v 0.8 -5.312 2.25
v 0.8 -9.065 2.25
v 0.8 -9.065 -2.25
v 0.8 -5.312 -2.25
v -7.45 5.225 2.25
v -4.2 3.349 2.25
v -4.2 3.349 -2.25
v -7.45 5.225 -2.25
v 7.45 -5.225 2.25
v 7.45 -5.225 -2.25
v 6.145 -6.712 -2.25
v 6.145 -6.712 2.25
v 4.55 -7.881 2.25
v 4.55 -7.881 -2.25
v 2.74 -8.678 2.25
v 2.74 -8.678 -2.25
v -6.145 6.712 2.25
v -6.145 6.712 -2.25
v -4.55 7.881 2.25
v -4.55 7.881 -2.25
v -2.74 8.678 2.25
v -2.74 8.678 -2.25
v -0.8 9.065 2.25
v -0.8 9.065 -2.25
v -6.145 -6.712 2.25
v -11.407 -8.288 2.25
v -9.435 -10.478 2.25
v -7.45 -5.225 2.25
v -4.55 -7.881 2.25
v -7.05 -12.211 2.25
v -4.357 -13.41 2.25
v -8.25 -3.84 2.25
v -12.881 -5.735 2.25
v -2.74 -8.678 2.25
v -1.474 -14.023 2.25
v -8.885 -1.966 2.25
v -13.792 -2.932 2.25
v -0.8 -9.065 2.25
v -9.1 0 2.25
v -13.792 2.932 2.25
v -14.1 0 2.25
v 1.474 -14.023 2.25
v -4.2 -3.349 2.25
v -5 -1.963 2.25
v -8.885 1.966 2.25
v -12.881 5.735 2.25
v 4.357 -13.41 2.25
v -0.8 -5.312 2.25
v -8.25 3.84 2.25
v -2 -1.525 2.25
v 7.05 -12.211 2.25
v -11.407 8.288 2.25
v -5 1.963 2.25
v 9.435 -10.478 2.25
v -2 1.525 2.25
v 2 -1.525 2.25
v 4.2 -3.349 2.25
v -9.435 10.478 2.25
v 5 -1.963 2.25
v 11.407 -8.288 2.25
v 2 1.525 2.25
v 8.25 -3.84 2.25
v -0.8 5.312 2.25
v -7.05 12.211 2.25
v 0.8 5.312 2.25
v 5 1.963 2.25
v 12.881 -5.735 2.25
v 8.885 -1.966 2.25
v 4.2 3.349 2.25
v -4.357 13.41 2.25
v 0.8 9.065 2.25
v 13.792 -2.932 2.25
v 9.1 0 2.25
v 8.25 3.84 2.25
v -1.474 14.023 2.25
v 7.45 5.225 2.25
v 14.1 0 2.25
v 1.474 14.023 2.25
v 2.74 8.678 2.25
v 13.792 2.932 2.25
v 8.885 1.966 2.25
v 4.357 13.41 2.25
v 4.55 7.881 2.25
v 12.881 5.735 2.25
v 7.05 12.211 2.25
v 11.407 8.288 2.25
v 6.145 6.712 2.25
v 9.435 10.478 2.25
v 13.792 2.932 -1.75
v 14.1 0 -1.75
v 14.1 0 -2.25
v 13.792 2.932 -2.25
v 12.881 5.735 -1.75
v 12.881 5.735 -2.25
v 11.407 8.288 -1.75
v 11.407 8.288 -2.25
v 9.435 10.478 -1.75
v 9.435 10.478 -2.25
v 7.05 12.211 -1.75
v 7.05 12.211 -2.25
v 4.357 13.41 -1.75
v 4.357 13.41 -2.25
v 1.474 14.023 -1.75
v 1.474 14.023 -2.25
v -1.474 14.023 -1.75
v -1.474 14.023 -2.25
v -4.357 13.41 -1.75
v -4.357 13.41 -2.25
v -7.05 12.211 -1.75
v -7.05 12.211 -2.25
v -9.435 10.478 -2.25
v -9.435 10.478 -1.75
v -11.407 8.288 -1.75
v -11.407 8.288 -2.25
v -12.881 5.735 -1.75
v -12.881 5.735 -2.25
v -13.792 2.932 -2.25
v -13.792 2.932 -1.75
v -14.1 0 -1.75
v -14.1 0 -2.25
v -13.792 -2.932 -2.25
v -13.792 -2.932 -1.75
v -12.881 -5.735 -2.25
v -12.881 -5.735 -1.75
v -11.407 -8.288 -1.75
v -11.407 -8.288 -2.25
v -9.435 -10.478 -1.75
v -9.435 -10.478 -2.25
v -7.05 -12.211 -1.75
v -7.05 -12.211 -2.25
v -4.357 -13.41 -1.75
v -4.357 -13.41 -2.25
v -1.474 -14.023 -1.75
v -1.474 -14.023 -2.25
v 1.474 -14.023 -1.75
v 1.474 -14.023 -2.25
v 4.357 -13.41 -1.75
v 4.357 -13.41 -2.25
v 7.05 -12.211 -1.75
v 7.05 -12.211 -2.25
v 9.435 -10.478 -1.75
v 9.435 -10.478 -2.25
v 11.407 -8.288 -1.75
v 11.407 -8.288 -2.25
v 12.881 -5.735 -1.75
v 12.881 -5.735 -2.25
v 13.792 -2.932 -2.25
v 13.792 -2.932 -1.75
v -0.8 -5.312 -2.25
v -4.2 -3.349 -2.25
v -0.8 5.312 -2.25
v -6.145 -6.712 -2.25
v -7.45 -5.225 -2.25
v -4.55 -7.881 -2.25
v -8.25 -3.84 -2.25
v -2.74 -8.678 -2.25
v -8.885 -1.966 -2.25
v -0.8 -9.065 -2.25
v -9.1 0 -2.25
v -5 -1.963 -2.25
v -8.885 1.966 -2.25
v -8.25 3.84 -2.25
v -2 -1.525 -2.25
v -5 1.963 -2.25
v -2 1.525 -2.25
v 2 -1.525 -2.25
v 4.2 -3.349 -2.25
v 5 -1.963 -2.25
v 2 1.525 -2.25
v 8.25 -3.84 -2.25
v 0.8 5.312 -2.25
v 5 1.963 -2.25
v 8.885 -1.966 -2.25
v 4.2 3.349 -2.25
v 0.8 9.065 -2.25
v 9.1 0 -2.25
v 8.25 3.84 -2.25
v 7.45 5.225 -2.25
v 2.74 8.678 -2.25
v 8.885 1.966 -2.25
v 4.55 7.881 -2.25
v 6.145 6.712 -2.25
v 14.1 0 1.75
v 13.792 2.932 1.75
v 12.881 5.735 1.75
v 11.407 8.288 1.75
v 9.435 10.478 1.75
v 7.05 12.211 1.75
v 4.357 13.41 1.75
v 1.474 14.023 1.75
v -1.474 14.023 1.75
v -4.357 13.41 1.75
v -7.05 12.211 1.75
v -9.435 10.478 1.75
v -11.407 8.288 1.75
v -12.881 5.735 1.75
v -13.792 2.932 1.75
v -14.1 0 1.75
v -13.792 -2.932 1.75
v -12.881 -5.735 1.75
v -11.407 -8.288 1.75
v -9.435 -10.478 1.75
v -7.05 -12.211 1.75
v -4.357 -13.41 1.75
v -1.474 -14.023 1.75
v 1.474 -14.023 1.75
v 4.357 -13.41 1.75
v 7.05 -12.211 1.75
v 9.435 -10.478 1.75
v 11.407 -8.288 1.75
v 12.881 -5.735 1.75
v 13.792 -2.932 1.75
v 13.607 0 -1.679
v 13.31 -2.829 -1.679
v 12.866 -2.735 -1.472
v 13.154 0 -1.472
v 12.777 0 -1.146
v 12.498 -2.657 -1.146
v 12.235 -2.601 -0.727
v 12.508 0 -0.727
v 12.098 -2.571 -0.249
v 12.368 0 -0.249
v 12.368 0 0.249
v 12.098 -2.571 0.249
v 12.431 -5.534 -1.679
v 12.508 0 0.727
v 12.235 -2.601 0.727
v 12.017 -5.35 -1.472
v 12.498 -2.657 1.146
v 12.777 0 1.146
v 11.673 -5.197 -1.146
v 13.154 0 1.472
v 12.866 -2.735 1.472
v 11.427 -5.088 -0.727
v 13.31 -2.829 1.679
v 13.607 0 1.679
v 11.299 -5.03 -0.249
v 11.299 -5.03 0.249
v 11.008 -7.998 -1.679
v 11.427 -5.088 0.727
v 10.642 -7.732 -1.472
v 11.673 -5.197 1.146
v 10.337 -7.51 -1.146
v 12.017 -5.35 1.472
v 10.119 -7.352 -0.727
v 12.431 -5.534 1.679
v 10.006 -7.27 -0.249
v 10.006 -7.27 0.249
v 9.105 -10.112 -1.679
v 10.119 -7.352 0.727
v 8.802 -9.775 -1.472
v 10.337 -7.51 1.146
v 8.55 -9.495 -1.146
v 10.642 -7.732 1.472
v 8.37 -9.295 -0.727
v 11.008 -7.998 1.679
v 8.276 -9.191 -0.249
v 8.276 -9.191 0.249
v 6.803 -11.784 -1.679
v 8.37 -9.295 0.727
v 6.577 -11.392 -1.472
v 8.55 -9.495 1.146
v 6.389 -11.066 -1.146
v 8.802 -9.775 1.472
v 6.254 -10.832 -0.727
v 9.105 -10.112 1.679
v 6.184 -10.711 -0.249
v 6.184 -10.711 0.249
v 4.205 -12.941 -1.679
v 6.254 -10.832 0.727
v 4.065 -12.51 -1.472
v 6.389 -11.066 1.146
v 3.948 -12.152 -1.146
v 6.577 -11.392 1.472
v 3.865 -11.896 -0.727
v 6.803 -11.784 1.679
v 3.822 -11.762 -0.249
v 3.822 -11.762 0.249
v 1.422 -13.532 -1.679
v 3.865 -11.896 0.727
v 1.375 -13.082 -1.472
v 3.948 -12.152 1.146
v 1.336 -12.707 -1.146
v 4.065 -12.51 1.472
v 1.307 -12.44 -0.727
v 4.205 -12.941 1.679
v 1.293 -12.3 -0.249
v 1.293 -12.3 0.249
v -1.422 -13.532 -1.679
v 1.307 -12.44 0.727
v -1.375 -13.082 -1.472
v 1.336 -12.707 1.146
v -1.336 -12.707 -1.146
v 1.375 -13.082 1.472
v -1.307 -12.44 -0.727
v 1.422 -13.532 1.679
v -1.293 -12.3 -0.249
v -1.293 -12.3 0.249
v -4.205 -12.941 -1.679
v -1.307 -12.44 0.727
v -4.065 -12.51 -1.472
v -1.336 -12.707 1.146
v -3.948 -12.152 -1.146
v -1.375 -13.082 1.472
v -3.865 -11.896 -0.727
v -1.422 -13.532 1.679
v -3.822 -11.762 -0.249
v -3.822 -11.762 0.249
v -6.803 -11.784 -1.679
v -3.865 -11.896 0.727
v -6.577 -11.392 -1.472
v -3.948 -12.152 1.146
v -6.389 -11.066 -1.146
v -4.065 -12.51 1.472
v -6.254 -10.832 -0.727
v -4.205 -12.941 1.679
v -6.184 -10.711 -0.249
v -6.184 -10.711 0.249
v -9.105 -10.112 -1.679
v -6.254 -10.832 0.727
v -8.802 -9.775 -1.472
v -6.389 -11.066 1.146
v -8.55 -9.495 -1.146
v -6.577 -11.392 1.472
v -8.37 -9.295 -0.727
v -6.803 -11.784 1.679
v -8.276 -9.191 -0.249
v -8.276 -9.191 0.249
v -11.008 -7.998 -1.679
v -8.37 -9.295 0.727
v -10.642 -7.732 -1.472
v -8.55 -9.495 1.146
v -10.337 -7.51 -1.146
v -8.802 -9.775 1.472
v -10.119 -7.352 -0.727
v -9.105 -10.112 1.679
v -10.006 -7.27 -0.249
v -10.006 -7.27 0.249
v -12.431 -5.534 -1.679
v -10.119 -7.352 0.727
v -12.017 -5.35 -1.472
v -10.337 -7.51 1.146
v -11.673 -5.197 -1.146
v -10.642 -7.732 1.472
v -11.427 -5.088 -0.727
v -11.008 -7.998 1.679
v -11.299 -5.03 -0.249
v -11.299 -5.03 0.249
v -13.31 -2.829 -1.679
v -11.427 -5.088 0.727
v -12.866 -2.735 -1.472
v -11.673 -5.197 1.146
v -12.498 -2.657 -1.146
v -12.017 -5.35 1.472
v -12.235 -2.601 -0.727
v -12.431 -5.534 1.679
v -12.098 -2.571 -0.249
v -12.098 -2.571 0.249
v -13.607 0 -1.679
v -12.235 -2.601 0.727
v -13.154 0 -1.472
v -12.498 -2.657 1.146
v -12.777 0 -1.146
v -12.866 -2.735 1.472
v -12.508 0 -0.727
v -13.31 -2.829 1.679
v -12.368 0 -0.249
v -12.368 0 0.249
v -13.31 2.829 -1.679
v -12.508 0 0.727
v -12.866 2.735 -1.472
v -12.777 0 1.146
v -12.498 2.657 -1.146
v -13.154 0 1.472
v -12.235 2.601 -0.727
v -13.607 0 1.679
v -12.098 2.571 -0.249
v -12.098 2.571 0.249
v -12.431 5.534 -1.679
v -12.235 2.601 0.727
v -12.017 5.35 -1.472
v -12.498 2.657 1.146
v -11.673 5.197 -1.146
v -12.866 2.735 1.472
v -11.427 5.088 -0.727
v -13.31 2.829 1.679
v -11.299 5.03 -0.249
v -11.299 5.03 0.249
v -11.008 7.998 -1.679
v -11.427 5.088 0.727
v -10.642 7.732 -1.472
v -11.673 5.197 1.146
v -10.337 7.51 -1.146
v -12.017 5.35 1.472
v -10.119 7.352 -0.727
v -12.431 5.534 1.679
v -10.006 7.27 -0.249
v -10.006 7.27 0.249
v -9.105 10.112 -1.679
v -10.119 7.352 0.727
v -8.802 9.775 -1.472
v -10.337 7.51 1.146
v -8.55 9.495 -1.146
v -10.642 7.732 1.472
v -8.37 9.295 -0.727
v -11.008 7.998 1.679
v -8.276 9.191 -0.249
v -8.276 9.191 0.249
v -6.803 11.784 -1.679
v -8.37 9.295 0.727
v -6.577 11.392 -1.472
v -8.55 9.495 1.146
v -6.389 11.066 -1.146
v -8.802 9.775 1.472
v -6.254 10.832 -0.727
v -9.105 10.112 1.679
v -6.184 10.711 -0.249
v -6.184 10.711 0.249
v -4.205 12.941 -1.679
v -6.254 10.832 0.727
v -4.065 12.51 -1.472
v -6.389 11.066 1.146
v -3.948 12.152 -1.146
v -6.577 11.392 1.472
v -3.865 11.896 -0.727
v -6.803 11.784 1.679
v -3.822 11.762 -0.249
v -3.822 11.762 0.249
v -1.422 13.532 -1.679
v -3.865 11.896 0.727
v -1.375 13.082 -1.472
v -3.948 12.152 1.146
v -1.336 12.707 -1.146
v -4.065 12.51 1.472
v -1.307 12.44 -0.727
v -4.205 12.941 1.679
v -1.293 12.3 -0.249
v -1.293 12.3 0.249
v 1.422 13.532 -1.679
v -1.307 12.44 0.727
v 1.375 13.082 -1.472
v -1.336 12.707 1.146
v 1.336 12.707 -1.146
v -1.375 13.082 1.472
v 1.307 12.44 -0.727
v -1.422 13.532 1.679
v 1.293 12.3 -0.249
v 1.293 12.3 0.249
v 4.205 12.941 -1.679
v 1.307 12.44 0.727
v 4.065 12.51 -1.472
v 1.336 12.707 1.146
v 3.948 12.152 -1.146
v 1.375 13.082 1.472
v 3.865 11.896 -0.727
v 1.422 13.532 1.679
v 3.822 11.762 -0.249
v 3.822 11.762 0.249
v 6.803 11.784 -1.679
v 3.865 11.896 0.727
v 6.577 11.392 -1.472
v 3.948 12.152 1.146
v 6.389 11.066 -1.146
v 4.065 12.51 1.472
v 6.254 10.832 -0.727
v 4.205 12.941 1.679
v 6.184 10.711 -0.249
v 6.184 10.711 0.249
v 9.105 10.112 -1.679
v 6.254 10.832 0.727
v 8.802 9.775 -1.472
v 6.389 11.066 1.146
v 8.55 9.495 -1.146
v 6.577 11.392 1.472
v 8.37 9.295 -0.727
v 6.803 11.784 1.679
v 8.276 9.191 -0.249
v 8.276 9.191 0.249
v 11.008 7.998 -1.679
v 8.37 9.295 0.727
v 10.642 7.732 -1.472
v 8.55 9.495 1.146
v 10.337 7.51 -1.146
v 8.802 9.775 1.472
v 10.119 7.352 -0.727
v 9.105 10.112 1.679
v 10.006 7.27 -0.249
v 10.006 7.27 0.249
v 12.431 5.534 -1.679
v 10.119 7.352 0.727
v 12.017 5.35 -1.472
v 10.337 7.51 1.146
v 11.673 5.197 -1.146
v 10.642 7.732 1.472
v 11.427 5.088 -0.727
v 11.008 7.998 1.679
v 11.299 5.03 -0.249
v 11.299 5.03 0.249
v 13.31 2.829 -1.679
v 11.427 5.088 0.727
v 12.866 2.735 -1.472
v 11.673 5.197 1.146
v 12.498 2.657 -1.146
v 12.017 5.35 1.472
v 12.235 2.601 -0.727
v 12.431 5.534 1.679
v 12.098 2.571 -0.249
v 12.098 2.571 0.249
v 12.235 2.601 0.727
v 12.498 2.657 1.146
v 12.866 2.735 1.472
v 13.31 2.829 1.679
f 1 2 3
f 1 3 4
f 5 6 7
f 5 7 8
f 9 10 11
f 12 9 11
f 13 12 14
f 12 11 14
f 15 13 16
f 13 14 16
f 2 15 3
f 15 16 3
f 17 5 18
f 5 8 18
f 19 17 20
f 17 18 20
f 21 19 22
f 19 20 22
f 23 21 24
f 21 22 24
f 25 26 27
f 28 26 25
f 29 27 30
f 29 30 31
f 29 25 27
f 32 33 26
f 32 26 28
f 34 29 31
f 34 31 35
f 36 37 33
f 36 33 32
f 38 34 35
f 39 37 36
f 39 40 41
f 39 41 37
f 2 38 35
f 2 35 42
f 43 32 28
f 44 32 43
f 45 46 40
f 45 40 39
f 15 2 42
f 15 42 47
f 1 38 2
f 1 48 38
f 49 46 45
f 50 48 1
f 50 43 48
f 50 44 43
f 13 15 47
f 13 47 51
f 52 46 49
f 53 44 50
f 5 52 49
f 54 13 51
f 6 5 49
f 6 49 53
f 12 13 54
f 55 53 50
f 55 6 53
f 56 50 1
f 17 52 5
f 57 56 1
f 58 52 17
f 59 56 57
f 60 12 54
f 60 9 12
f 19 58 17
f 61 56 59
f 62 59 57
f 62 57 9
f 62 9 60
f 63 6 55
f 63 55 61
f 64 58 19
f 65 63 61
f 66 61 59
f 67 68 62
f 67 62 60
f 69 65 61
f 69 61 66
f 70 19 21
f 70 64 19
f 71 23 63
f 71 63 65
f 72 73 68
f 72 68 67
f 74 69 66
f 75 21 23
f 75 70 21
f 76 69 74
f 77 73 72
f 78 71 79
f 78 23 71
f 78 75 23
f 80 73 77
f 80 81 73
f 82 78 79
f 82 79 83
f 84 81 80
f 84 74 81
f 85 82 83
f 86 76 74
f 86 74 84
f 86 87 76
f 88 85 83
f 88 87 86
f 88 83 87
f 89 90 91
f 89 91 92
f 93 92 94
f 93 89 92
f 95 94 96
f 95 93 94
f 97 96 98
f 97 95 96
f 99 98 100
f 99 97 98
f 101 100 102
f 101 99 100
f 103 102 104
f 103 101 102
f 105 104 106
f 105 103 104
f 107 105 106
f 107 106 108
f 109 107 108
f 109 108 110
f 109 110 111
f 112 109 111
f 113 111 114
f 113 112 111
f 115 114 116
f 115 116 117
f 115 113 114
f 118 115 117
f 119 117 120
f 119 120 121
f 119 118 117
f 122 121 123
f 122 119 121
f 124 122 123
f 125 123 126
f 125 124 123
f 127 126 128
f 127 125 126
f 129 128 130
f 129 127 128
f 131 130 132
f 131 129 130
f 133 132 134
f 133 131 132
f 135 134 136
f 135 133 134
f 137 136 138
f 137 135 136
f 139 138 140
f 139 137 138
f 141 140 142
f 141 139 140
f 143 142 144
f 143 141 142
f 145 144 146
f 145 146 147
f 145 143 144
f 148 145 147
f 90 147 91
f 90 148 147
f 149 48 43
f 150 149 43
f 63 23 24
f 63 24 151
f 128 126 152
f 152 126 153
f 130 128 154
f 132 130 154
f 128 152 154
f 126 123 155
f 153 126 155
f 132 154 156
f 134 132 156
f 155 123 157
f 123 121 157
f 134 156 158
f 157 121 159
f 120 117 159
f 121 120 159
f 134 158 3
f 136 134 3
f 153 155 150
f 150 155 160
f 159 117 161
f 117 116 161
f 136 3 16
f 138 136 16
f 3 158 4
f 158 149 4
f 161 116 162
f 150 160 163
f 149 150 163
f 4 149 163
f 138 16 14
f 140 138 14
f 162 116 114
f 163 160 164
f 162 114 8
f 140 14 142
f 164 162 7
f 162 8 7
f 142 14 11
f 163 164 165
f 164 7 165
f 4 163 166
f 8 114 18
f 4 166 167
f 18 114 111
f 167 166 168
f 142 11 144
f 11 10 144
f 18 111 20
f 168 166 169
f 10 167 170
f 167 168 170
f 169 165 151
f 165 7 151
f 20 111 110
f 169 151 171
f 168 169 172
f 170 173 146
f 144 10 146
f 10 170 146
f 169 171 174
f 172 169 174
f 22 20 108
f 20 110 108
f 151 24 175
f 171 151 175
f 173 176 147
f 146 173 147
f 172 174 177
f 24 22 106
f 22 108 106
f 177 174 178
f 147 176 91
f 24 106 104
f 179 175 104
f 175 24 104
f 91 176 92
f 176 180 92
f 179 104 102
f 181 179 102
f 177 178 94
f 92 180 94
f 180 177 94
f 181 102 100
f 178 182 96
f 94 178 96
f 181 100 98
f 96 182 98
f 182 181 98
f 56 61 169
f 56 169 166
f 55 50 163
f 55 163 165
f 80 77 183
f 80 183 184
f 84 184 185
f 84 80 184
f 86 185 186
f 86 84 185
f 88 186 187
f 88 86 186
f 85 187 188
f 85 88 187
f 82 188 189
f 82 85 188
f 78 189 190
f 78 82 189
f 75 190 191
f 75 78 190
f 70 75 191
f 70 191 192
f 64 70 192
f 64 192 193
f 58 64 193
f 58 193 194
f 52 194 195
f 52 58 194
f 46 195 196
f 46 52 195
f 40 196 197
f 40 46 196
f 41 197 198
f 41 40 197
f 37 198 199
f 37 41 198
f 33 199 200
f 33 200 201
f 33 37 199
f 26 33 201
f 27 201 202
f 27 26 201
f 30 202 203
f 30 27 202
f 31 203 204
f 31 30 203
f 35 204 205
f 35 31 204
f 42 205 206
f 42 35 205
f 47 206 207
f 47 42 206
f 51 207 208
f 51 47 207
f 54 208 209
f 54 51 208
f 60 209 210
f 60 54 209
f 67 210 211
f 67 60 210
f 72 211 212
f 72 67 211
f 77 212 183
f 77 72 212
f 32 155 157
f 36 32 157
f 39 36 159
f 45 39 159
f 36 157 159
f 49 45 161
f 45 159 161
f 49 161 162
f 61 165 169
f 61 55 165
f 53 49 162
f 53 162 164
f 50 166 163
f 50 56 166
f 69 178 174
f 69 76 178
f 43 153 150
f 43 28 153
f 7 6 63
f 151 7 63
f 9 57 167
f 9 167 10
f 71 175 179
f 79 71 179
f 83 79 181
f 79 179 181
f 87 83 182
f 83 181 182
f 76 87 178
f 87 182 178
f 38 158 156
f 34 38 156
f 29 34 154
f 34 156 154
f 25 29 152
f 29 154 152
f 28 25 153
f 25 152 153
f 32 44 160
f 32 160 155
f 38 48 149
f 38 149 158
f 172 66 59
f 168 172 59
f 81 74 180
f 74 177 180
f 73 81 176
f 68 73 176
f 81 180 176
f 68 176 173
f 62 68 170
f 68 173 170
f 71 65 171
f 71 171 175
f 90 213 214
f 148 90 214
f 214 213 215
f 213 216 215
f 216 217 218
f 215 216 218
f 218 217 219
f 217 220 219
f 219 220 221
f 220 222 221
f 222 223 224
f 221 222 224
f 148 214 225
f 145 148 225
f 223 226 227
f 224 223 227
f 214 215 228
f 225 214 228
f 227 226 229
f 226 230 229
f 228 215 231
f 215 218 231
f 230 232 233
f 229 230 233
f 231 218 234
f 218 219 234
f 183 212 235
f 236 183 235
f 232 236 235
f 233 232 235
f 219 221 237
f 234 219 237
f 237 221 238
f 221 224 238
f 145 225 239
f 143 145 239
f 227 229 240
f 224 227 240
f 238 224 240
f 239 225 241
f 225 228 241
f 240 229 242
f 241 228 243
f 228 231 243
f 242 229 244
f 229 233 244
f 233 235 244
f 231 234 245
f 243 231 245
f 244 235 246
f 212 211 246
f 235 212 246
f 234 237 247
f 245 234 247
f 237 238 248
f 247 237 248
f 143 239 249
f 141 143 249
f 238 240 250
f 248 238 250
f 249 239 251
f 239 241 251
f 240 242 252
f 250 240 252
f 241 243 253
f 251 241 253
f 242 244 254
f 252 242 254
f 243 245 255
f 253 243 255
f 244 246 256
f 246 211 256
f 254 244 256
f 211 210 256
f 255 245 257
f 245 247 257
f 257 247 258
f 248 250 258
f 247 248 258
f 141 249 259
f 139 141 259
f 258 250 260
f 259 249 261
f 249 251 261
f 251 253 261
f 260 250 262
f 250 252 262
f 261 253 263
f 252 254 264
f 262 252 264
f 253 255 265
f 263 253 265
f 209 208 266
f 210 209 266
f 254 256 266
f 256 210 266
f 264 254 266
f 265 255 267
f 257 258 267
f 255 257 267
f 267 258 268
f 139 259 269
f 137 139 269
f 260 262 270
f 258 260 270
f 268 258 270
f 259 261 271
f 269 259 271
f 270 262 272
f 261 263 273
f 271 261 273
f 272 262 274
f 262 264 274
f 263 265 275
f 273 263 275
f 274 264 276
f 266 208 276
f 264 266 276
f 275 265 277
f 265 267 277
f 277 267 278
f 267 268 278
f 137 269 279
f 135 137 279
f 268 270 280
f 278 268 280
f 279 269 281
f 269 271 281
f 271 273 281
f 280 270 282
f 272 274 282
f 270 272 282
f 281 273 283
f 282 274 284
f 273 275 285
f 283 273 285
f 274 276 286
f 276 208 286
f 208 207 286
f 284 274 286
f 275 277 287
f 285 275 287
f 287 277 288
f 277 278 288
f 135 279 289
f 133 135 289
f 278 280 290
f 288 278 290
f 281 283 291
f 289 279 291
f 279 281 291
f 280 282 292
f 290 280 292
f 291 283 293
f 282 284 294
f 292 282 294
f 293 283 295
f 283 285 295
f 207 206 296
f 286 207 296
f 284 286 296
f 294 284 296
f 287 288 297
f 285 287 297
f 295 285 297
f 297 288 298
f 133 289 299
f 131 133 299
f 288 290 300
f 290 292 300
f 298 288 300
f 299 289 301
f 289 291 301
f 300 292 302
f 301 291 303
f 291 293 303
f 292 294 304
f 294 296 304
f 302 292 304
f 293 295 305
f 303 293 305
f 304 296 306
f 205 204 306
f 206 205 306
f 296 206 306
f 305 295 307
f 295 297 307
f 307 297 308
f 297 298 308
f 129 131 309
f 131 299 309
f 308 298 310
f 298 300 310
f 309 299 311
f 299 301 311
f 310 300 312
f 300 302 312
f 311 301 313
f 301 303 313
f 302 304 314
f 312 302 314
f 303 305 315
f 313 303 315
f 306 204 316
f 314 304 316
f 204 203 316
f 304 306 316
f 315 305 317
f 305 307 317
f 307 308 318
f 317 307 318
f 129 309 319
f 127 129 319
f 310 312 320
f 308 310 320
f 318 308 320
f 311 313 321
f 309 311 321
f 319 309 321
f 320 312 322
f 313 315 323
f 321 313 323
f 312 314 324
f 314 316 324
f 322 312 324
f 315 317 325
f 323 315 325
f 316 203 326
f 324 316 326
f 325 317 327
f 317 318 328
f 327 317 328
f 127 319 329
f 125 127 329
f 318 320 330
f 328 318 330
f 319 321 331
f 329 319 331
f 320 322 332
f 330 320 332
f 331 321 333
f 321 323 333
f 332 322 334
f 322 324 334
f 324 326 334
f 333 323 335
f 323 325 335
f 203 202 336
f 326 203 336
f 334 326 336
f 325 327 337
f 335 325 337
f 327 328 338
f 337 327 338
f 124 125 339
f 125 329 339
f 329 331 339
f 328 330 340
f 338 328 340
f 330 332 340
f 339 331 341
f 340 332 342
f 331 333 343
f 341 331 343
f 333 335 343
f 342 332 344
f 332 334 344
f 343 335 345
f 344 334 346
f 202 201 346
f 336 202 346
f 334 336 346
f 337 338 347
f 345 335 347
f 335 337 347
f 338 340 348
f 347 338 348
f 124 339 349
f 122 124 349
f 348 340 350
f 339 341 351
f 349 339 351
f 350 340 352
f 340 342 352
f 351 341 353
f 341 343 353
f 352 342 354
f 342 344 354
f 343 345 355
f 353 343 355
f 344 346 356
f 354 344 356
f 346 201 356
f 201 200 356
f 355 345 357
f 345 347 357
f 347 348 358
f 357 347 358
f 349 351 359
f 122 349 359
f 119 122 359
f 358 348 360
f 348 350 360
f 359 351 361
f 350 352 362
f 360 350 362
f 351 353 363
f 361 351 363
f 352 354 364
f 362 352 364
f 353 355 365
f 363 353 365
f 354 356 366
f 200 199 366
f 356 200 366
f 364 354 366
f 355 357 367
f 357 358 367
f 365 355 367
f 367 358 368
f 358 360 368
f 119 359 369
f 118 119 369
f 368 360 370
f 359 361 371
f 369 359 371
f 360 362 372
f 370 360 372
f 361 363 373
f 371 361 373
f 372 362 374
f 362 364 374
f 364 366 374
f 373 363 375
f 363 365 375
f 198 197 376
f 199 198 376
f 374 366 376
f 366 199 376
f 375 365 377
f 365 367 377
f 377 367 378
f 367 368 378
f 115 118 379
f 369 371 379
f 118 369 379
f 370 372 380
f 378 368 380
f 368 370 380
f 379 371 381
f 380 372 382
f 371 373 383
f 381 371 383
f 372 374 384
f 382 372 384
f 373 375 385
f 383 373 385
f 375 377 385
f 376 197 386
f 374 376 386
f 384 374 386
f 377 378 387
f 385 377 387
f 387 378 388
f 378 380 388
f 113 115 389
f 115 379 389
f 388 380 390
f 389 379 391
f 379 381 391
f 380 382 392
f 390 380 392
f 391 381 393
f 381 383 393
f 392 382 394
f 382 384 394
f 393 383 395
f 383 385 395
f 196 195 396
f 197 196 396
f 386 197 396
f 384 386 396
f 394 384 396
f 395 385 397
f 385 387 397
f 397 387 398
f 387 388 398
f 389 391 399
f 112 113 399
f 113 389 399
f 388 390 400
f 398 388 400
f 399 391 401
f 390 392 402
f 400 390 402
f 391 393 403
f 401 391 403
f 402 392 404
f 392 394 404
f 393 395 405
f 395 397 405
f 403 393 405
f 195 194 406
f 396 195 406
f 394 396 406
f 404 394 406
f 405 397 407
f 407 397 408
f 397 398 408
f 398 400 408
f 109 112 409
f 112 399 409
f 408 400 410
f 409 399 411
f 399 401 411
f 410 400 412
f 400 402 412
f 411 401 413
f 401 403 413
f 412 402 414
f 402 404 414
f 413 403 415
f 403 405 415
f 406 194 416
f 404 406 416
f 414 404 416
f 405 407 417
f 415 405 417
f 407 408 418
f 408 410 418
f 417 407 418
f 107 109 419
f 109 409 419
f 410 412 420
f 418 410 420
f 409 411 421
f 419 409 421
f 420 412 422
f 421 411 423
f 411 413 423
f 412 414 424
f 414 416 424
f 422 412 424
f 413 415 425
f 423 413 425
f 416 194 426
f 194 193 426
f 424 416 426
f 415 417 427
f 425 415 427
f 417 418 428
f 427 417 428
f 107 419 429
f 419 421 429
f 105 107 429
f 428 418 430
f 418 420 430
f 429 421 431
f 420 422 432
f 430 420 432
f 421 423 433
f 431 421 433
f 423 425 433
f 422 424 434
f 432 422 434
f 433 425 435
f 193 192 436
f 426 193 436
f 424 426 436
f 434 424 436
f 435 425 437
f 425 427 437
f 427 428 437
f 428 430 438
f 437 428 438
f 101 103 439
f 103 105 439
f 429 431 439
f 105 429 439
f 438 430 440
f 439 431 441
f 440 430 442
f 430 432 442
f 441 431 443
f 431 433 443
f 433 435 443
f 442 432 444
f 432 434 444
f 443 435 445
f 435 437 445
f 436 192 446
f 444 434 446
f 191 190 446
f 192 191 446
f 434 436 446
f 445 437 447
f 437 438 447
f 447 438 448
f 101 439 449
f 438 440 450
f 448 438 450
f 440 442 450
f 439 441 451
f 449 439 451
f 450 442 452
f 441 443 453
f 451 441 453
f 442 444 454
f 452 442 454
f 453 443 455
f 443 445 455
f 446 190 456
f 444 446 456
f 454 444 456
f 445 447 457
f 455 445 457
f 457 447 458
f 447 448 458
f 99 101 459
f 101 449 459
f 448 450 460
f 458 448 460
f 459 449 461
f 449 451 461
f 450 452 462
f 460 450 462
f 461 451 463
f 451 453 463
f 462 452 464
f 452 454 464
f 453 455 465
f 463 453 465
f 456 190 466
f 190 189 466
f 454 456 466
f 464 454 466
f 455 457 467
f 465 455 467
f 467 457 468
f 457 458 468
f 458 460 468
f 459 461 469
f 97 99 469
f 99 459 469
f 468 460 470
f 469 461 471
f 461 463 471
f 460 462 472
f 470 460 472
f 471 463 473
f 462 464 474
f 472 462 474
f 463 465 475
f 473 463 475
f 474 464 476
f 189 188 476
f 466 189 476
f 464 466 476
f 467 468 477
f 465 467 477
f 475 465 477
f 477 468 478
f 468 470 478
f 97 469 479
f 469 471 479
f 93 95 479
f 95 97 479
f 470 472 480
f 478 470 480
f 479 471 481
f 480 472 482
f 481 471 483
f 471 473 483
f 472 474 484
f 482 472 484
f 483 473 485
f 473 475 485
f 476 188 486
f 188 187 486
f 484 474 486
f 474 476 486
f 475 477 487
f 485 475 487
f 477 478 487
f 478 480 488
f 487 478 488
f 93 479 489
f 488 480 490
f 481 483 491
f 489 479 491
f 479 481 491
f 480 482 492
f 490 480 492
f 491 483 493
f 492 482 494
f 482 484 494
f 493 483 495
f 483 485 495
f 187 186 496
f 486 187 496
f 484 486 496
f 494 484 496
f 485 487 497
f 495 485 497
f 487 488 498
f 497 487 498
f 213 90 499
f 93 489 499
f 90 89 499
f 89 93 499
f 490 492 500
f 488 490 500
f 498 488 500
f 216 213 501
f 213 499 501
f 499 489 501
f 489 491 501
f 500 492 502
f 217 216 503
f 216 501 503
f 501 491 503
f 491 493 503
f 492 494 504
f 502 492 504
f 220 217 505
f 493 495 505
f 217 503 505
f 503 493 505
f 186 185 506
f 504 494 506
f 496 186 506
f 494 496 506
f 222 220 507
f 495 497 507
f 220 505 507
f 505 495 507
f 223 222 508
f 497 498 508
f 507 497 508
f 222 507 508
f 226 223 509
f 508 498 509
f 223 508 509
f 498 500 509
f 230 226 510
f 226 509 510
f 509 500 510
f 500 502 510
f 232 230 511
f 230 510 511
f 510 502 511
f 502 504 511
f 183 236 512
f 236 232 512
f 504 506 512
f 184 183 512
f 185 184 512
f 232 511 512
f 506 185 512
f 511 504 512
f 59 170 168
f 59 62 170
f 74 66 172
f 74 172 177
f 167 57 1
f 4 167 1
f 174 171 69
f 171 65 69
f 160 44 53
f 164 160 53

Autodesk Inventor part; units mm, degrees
ref_plane "YZ Plane" through (0, 0, 0) normal (1, 0, 0) x (0, 1, 0)
ref_plane "XZ Plane" through (0, 0, 0) normal (0, 1, 0) x (-1, 0, 0)
ref_plane "XY Plane" through (0, 0, 0) normal (0, 0, 1) x (1, 0, 0)
sketch "スケッチ1" plane through (0, 0, 0) normal (0, 1, 0) x (-1, 0, 0)
  line L0 (0, 0) -> (-64.0652, 0) construction
  circle A0 centre (-14.1, 0) radius 1.75
  line L1 (-9.1, -2.25) -> (-14.1, -2.25)
  line L2 (-14.1, -2.25) -> (-14.1, 2.25)
  line L3 (-14.1, 2.25) -> (-9.1, 2.25)
  line L4 (-9.1, 2.25) -> (-9.1, -2.25)
  line L5 (0, -4.9) -> (0, 4.9) projected
  point P0 (-14.1, 1.75)
  point P1 (-14.1, -1.75)
  dimension "P_DIA" = 3.5
  dimension "P_D1" = 14.1
  dimension "WW" = 4.5
  dimension "d3" = 5
revolve "リム" add sketch "スケッチ1" angle 360 about axis through (0, 0, -10) along (0, 0, 1) contours A0 L2 L3 L4 L1
sketch "スケッチ3" plane through (0, 0, 2.25) normal (0, 0, 1) x (1, 0, 0)
  line L0 (-5, 2.8868) -> (0, 5.7735)
  line L1 (0, 5.7735) -> (5, 2.8868)
  line L2 (5, 2.8868) -> (5, -2.8868)
  line L3 (5, -2.8868) -> (0, -5.7735)
  line L4 (0, -5.7735) -> (-5, -2.8868)
  line L5 (-5, -2.8868) -> (-5, 2.8868)
  point P0 (0, 0)
  point P1 (0, 0)
  dimension "HUB_DIA" = 10
extrude "ハブ" add sketch "スケッチ3" against normal up to surface (4.5 mm away)
sketch "スケッチ4" plane through (0, 0, 2.25) normal (0, 0, 1) x (1, 0, 0)
  line L0 (-0.8, 0) -> (0.8, 0)
  line L1 (0.8, 0) -> (0.8, 9.1)
  line L2 (0.8, 9.1) -> (-0.8, 9.1)
  line L3 (-0.8, 9.1) -> (-0.8, 0)
  circle A0 centre (0, 0) radius 9.1 projected
  point P0 (0, 9.1)
  dimension "SPOKE_THIN" = 1.6
extrude "スポーク" add sketch "スケッチ4" against normal up to surface (4.5 mm away) contours L3 A0 L1 L0 | L3 L2 A0 | A0 L2 L1 picked at (0, 3.0333)
pattern_circular "円形状パターン1" count 6 over 360 about axis through (0, 0, -10) along (0, 0, 1) of "スポーク"
sketch "スケッチ5" plane through (0, 0, 2.25) normal (0, 0, 1) x (1, 0, 0)
  line L0 (-2, 1.525) -> (2, 1.525)
  line L1 (2, 1.525) -> (2, -1.525)
  line L2 (2, -1.525) -> (-2, -1.525)
  line L3 (-2, -1.525) -> (-2, 1.525)
  point P0 (0, 0)
  point P1 (0, 1.525)
  point P2 (-2, 0)
  dimension "d15" = 4
  dimension "d16" = 3.05
extrude "軸穴" cut sketch "スケッチ5" against normal through all
properties part number "Wheel-D63C"
